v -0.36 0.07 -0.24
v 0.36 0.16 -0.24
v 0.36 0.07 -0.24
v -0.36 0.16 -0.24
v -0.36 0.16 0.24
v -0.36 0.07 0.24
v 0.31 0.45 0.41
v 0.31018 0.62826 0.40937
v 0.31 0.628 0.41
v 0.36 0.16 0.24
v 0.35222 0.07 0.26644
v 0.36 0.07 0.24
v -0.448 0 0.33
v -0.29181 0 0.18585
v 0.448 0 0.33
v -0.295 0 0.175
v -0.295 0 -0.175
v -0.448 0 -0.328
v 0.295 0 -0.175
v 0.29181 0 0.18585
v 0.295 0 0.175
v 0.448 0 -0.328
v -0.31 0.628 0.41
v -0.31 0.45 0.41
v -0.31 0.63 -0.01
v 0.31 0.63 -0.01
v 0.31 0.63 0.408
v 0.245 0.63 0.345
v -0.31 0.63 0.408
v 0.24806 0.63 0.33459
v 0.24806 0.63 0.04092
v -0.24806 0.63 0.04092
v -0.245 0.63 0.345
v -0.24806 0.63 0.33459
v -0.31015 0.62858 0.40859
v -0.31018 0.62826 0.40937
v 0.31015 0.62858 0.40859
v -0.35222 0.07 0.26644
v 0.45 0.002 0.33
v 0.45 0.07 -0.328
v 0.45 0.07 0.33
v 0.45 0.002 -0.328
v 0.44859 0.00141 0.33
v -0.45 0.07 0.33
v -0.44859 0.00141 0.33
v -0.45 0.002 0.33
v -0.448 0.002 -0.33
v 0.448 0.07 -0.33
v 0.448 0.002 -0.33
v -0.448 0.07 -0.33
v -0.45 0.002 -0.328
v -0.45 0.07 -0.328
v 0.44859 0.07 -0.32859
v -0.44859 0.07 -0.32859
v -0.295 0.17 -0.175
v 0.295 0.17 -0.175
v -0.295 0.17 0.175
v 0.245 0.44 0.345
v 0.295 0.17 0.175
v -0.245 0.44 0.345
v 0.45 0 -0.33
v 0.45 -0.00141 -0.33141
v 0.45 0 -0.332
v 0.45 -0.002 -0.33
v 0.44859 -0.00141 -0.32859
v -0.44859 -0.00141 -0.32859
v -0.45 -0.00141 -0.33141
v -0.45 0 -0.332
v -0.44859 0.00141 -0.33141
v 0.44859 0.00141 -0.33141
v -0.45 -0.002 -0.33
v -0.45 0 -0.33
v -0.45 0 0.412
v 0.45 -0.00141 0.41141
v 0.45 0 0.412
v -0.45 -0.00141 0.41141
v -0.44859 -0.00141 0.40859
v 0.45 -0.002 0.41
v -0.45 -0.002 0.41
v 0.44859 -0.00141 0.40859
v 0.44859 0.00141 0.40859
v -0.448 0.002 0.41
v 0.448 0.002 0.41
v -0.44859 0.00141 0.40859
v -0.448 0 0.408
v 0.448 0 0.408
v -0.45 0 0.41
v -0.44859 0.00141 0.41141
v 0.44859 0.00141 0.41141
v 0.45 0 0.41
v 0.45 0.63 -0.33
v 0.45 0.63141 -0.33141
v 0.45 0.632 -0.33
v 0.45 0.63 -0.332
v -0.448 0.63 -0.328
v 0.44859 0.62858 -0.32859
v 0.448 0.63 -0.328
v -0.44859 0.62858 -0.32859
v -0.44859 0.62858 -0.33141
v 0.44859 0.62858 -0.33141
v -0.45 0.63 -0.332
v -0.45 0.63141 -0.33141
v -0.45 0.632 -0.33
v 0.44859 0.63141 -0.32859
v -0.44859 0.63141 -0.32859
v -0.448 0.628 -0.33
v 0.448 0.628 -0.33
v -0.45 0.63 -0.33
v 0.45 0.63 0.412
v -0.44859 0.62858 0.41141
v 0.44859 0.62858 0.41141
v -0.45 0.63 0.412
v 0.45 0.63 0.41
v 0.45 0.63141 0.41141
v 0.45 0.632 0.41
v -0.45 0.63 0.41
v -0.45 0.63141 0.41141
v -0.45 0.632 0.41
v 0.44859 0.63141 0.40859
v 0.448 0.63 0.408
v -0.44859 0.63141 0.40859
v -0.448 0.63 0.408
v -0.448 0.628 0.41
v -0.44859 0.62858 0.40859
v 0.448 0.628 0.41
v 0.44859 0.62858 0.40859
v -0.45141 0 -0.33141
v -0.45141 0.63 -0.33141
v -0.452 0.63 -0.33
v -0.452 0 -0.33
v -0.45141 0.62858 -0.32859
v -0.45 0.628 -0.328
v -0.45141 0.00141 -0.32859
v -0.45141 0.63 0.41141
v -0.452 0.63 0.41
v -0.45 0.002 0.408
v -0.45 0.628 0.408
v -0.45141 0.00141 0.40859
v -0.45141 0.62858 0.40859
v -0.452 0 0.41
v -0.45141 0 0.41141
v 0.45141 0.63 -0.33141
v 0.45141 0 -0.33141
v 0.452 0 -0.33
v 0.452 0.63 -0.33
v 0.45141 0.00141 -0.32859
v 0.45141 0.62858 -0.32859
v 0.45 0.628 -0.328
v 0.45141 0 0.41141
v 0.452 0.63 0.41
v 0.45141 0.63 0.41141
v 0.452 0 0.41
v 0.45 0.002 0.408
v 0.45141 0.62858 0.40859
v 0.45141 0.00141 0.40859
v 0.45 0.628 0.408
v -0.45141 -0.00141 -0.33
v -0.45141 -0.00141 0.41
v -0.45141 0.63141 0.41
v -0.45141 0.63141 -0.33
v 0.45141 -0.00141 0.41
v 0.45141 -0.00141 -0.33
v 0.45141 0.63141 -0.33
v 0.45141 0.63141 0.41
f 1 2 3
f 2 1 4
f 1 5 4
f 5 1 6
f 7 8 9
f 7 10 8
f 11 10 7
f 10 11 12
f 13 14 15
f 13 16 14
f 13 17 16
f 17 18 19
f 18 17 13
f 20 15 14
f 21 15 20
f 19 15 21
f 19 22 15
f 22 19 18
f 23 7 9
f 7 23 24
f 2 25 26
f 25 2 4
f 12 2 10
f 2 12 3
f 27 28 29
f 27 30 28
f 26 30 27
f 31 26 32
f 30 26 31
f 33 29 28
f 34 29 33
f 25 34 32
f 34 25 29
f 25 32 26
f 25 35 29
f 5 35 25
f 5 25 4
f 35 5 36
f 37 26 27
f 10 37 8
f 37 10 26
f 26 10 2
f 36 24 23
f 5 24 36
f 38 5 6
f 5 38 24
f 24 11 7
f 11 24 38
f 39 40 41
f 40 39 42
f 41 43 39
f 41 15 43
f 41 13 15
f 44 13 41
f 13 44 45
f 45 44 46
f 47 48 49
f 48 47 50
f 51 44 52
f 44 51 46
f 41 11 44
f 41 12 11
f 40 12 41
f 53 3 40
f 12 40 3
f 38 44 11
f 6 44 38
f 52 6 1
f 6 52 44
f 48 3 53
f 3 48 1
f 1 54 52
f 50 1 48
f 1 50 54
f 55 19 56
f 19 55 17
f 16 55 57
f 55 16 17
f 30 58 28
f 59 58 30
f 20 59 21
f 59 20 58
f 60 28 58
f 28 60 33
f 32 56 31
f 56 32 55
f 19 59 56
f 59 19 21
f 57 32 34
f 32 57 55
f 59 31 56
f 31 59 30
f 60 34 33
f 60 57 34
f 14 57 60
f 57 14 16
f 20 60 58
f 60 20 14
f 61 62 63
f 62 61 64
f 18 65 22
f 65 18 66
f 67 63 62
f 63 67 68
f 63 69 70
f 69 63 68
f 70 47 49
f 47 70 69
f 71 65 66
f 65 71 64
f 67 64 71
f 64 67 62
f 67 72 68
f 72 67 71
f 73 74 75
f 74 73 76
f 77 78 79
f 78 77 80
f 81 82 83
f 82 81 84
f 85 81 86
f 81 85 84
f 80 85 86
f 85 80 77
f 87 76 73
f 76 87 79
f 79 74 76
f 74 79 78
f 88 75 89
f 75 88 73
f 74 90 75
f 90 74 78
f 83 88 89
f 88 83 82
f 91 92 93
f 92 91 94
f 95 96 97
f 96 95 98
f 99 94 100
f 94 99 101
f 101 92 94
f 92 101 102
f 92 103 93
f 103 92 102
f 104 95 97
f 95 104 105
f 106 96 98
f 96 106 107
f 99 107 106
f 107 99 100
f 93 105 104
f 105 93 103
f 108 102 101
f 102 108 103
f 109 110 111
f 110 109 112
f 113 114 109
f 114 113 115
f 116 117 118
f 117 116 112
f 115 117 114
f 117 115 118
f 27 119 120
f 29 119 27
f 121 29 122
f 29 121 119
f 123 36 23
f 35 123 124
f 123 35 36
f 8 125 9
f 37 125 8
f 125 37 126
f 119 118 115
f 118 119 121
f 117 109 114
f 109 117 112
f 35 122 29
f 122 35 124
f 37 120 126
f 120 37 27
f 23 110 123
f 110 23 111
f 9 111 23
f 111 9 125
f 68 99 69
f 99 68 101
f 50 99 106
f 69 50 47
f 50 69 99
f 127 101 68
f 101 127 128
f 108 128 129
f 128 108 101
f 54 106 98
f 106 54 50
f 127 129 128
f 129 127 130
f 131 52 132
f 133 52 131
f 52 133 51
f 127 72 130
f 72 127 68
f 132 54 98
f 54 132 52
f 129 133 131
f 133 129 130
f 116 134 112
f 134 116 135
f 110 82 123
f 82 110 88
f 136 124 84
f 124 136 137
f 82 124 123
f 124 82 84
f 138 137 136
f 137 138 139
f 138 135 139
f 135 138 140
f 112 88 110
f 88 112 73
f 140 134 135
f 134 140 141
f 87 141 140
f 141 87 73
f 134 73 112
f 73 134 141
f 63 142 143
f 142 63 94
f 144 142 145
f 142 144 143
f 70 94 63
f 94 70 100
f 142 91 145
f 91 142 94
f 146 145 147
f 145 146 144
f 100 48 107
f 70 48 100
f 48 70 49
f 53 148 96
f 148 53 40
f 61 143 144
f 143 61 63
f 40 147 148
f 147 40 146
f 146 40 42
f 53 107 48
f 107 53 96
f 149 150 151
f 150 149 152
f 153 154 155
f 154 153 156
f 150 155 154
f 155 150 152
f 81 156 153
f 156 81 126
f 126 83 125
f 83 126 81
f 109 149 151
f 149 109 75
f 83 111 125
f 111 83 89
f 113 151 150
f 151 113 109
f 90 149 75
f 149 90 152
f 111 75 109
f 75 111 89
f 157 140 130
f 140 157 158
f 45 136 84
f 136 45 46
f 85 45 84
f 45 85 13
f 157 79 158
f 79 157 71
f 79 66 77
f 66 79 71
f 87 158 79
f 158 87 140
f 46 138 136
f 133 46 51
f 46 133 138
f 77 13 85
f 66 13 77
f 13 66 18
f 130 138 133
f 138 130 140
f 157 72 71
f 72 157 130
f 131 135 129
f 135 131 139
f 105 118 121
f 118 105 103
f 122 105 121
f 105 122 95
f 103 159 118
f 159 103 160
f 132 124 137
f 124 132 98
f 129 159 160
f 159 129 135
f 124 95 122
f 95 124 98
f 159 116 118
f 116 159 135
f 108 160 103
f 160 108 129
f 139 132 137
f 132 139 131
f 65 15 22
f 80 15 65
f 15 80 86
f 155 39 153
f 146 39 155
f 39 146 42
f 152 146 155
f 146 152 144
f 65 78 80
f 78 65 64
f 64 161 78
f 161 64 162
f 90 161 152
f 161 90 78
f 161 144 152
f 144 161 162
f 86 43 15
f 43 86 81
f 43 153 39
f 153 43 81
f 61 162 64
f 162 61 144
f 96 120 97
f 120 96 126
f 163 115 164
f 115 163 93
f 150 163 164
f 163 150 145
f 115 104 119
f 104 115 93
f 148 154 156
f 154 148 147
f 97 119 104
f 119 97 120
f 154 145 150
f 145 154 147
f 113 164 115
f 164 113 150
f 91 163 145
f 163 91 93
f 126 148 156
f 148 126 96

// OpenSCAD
// file: belt-chute.scad
// Unit envelope throat, inlet at y=0, outlet offset toward +z.
module outer(){hull(){translate([0,.08,0]) cube([.72,.16,.48],center=true); translate([0,.54,.20]) cube([.62,.18,.42],center=true);}}
module inner(){hull(){translate([0,.07,0]) cube([.59,.20,.35],center=true); translate([0,.55,.20]) cube([.49,.22,.29],center=true);}}
module chute(){difference(){union(){outer(); translate([0,.035,0]) cube([.9,.07,.66],center=true);} inner();}}
chute();
// main file
use <belt-chute.scad>
color("#8E9296") chute();
lo=[-0.45, 0, -0.33]; hi=[0.45, 0.63, 0.41]; r=0.002;
color("yellow") {
 for(y=[lo[1],hi[1]],z=[lo[2],hi[2]]) translate([lo[0],y,z]) rotate([0,90,0]) cylinder(h=hi[0]-lo[0],r=r,$fn=8);
 for(x=[lo[0],hi[0]],z=[lo[2],hi[2]]) translate([x,lo[1],z]) rotate([-90,0,0]) cylinder(h=hi[1]-lo[1],r=r,$fn=8);
 for(x=[lo[0],hi[0]],y=[lo[1],hi[1]]) translate([x,y,lo[2]]) cylinder(h=hi[2]-lo[2],r=r,$fn=8);
}
